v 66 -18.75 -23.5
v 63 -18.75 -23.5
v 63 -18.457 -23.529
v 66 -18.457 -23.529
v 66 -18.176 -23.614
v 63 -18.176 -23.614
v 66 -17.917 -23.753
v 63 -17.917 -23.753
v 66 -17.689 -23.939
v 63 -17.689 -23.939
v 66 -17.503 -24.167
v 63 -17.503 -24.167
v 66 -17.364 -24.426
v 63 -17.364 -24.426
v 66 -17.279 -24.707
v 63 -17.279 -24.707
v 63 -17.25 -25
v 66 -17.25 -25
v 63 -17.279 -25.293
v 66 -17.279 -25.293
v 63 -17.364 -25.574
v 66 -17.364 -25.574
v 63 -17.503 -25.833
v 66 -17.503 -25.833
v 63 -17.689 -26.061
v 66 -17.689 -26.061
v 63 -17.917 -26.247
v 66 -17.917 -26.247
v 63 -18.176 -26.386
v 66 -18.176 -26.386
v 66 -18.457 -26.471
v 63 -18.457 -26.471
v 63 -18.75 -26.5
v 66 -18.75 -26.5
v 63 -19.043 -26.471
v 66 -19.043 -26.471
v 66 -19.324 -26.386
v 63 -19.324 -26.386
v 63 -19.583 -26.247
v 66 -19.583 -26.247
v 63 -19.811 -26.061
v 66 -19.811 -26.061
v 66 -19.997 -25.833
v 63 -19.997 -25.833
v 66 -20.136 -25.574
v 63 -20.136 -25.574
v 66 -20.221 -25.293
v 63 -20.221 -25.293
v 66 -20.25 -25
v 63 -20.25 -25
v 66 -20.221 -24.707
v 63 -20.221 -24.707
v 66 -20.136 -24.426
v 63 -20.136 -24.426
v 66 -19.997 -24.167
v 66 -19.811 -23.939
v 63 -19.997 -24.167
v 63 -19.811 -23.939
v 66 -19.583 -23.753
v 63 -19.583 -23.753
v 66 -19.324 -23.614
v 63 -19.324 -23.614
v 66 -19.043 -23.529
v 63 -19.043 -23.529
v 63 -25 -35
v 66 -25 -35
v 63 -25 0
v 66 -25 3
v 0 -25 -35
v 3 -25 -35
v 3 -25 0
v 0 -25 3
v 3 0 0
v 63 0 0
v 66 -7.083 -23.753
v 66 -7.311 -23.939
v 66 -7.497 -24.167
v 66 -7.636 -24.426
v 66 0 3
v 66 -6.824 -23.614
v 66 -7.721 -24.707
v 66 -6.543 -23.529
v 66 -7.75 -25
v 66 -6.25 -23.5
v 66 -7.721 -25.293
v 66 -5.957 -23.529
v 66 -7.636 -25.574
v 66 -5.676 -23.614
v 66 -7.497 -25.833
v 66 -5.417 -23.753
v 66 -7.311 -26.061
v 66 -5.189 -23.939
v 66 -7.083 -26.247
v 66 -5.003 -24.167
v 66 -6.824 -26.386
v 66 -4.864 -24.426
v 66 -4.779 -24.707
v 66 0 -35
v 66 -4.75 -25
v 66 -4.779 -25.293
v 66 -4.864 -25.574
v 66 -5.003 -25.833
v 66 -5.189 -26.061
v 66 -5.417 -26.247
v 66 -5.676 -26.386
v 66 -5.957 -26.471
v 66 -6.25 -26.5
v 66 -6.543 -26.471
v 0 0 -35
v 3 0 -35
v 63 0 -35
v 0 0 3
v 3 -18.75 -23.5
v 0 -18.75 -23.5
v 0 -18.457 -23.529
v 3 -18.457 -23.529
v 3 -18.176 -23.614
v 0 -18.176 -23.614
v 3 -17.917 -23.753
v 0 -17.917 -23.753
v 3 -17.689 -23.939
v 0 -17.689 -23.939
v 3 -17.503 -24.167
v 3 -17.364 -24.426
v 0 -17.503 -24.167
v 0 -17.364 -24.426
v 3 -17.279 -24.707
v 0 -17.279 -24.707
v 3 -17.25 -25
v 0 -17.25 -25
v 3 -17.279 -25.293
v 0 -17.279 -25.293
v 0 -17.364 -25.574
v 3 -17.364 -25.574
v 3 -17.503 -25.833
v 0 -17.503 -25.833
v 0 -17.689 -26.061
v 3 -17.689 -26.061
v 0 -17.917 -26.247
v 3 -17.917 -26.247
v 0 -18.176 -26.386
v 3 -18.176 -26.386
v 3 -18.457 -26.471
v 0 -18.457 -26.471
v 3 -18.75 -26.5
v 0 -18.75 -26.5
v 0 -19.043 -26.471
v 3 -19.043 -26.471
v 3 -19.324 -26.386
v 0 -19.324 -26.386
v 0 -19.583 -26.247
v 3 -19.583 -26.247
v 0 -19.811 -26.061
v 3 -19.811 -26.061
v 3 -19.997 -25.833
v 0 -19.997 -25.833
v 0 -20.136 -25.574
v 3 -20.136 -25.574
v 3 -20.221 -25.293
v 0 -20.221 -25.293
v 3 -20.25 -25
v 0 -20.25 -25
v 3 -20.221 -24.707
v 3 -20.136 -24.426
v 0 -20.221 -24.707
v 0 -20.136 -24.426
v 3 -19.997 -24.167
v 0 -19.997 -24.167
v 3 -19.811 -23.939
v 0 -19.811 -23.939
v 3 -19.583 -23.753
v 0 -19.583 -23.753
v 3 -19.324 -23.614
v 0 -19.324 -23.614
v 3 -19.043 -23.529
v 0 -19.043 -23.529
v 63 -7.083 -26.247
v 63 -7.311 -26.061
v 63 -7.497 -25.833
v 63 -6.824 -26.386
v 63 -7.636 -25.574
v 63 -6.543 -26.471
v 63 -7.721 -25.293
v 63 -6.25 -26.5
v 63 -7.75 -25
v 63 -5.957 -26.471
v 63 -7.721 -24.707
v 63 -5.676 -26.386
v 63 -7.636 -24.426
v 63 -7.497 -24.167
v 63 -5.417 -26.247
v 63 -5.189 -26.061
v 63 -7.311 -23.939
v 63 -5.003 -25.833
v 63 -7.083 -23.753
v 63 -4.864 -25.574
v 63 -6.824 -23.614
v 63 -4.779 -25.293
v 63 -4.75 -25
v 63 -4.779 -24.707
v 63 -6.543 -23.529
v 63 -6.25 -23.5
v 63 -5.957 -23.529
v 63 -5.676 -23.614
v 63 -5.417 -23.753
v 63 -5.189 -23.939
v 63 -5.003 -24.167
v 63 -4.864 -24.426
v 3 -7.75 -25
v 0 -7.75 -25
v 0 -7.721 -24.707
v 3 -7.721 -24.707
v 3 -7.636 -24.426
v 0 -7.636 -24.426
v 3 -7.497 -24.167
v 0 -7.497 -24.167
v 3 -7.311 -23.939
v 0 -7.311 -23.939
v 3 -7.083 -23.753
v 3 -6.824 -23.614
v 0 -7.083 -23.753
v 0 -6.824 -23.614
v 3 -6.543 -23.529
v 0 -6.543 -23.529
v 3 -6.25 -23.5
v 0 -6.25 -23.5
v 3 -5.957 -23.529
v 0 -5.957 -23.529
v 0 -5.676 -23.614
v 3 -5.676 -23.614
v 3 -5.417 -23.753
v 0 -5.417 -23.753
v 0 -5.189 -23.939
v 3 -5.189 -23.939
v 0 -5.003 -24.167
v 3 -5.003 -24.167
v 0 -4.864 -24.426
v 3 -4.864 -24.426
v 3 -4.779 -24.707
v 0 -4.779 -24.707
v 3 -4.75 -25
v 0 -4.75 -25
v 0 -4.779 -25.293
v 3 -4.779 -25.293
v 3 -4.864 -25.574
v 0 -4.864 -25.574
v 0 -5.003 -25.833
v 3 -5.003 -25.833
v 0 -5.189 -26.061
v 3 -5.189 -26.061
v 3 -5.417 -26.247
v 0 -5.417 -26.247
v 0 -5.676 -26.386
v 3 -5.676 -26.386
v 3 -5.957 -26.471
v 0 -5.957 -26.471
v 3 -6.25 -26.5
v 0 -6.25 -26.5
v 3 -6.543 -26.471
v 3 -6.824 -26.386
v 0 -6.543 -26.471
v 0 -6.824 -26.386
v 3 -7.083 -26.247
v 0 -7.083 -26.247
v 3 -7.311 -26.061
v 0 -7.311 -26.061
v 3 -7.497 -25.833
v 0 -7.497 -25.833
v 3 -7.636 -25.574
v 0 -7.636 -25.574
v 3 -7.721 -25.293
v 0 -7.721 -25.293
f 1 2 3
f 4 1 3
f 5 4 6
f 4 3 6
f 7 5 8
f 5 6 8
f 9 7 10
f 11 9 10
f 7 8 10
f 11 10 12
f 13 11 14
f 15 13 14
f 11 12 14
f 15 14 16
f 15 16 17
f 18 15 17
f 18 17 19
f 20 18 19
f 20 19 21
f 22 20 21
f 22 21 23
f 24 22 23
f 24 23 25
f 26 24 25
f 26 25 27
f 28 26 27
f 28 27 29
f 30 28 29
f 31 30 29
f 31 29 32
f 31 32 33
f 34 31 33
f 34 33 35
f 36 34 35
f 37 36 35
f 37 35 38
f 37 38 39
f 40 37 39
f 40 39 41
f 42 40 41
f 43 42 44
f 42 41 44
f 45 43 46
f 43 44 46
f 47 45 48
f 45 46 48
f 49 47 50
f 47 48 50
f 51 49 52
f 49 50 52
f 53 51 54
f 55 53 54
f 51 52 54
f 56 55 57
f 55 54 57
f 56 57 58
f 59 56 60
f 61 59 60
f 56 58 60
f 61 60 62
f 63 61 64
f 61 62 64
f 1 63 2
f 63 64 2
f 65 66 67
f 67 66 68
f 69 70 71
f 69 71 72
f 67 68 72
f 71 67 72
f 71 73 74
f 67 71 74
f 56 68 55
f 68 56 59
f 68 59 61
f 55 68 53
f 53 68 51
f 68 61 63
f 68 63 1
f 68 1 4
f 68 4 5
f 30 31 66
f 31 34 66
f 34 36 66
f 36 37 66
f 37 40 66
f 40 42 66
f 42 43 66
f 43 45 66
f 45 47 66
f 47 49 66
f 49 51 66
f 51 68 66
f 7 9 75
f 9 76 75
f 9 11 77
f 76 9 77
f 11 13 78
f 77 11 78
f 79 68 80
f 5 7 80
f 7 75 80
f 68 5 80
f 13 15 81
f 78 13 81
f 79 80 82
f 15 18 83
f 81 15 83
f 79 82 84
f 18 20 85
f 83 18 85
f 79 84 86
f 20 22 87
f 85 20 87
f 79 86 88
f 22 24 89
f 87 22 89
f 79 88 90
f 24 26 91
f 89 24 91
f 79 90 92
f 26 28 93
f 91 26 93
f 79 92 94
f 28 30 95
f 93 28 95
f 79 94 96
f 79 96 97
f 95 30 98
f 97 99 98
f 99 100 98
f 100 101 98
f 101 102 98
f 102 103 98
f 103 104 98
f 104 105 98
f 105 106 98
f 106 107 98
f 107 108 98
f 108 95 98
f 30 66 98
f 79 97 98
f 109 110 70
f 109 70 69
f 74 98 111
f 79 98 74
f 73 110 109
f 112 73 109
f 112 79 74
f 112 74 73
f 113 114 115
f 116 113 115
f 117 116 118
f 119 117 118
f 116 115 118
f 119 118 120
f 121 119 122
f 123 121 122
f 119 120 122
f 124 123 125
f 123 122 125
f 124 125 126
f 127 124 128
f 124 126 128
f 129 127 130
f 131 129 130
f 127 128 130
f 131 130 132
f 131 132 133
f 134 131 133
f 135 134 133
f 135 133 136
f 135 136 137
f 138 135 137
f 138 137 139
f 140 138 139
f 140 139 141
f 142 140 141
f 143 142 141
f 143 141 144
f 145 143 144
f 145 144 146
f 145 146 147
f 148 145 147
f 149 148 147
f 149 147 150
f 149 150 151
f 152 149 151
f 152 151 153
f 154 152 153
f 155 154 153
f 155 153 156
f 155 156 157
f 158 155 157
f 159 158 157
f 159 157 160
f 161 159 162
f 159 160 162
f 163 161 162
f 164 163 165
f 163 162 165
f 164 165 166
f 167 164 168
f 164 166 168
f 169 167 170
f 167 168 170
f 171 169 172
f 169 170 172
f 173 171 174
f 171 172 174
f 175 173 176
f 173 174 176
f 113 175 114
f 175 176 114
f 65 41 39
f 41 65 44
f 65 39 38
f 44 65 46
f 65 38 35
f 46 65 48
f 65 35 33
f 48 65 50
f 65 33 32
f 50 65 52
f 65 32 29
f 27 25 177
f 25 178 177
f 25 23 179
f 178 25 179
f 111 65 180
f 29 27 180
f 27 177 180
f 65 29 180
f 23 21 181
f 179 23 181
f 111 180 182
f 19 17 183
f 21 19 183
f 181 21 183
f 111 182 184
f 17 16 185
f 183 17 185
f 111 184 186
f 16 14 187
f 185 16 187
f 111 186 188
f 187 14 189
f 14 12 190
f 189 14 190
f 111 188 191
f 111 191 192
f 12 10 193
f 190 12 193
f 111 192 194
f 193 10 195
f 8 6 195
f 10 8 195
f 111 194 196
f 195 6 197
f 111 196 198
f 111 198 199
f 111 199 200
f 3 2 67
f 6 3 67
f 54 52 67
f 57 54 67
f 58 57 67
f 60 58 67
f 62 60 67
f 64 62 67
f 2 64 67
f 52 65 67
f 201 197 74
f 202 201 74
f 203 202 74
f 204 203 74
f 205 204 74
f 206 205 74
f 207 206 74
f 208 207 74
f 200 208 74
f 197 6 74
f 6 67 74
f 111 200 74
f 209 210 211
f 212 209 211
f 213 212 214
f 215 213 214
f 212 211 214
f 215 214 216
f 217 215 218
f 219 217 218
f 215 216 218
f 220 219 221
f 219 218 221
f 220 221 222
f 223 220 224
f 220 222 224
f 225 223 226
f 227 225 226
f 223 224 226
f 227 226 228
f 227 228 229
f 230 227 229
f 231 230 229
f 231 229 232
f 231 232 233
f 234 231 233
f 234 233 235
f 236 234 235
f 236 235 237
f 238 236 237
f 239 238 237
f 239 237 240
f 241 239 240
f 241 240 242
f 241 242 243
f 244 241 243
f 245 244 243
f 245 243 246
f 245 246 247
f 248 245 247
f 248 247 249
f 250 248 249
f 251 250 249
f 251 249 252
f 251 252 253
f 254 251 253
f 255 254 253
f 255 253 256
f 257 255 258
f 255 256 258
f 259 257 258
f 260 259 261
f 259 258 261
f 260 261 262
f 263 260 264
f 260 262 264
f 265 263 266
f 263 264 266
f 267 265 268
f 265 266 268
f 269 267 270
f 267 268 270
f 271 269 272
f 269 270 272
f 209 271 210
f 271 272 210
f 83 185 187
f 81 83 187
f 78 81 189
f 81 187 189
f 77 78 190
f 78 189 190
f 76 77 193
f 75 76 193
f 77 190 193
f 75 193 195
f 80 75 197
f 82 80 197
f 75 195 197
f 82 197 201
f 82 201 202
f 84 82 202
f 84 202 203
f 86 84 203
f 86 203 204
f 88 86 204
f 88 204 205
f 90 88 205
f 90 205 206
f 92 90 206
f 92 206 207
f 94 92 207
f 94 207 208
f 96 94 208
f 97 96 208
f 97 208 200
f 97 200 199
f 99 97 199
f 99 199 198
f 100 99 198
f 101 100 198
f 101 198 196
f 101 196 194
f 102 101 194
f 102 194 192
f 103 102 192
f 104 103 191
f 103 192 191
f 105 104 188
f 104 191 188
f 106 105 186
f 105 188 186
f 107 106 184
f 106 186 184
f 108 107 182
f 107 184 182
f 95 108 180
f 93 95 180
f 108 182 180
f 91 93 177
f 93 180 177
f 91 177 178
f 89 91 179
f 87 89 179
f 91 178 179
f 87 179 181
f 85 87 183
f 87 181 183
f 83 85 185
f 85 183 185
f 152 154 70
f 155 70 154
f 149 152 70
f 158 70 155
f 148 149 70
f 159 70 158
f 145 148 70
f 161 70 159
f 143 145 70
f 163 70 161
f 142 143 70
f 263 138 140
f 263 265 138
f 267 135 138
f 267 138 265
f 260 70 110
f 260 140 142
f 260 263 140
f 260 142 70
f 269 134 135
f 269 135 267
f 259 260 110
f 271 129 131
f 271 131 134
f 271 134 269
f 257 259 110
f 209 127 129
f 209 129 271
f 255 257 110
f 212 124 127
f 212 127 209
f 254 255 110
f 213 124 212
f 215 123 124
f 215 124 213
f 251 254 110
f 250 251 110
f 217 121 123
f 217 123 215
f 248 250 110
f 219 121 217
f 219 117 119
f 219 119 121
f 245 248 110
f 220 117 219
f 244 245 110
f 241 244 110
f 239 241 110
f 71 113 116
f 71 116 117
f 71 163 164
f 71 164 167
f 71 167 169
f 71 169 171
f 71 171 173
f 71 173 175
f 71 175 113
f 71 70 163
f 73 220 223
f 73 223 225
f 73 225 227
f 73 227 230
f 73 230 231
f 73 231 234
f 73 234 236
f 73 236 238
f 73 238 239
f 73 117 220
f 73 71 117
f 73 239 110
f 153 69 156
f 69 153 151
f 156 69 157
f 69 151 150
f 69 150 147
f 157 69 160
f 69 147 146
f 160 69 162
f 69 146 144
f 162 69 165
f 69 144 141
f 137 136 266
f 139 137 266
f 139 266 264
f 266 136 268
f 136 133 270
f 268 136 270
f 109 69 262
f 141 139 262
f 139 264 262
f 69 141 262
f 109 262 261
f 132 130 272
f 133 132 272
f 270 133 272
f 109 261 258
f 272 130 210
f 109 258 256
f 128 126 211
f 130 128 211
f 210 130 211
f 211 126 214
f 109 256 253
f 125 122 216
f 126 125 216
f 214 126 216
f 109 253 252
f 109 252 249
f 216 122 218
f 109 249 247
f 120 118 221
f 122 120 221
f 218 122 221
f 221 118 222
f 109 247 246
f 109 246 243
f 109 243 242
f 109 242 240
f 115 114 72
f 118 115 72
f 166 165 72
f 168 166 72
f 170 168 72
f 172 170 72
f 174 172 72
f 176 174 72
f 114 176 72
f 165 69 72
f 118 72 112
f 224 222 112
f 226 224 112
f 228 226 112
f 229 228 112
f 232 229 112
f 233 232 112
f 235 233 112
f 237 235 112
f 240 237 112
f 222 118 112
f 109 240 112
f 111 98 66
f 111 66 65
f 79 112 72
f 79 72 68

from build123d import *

# Parameters (mm, degrees)
SKETCH_1_W          = 66
SKETCH_1_H          = 25
EXTRUDE_1_DEPTH     = 3
SKETCH_2_W          = 3
SKETCH_2_H          = 25
EXTRUDE_2_DEPTH     = 35
SKETCH_3_R          = 1.5
CUT_EXTRUDE_1_DEPTH = 79.778169565


with BuildPart() as part:
    # 草图1 → 凸台-拉伸1 (new body)
    with BuildSketch(Plane.XY):
        with Locations((33, -12.5)):
            Rectangle(SKETCH_1_W, SKETCH_1_H)
    extrude(amount=EXTRUDE_1_DEPTH)

    # 草图2 → 凸台-拉伸2 (add)
    with BuildSketch(Plane(origin=(0, 0, 0), x_dir=(-1, 0, 0), z_dir=(0, 0, -1))):
        with Locations((-1.5, -12.5)):
            Rectangle(SKETCH_2_W, SKETCH_2_H)
        with Locations((-64.5, -12.5)):
            Rectangle(SKETCH_2_W, SKETCH_2_H)
    extrude(amount=EXTRUDE_2_DEPTH)

    # 草图3 → 切除-拉伸1 (cut, through all)
    with BuildSketch(Plane.ZY):
        with Locations(Location((-25, -6.25, 0), (0, 0, 270))):
            Circle(SKETCH_3_R)
        with Locations((-25, -18.75)):
            Circle(SKETCH_3_R)
    extrude(amount=-CUT_EXTRUDE_1_DEPTH, mode=Mode.SUBTRACT)


solid = part.part
